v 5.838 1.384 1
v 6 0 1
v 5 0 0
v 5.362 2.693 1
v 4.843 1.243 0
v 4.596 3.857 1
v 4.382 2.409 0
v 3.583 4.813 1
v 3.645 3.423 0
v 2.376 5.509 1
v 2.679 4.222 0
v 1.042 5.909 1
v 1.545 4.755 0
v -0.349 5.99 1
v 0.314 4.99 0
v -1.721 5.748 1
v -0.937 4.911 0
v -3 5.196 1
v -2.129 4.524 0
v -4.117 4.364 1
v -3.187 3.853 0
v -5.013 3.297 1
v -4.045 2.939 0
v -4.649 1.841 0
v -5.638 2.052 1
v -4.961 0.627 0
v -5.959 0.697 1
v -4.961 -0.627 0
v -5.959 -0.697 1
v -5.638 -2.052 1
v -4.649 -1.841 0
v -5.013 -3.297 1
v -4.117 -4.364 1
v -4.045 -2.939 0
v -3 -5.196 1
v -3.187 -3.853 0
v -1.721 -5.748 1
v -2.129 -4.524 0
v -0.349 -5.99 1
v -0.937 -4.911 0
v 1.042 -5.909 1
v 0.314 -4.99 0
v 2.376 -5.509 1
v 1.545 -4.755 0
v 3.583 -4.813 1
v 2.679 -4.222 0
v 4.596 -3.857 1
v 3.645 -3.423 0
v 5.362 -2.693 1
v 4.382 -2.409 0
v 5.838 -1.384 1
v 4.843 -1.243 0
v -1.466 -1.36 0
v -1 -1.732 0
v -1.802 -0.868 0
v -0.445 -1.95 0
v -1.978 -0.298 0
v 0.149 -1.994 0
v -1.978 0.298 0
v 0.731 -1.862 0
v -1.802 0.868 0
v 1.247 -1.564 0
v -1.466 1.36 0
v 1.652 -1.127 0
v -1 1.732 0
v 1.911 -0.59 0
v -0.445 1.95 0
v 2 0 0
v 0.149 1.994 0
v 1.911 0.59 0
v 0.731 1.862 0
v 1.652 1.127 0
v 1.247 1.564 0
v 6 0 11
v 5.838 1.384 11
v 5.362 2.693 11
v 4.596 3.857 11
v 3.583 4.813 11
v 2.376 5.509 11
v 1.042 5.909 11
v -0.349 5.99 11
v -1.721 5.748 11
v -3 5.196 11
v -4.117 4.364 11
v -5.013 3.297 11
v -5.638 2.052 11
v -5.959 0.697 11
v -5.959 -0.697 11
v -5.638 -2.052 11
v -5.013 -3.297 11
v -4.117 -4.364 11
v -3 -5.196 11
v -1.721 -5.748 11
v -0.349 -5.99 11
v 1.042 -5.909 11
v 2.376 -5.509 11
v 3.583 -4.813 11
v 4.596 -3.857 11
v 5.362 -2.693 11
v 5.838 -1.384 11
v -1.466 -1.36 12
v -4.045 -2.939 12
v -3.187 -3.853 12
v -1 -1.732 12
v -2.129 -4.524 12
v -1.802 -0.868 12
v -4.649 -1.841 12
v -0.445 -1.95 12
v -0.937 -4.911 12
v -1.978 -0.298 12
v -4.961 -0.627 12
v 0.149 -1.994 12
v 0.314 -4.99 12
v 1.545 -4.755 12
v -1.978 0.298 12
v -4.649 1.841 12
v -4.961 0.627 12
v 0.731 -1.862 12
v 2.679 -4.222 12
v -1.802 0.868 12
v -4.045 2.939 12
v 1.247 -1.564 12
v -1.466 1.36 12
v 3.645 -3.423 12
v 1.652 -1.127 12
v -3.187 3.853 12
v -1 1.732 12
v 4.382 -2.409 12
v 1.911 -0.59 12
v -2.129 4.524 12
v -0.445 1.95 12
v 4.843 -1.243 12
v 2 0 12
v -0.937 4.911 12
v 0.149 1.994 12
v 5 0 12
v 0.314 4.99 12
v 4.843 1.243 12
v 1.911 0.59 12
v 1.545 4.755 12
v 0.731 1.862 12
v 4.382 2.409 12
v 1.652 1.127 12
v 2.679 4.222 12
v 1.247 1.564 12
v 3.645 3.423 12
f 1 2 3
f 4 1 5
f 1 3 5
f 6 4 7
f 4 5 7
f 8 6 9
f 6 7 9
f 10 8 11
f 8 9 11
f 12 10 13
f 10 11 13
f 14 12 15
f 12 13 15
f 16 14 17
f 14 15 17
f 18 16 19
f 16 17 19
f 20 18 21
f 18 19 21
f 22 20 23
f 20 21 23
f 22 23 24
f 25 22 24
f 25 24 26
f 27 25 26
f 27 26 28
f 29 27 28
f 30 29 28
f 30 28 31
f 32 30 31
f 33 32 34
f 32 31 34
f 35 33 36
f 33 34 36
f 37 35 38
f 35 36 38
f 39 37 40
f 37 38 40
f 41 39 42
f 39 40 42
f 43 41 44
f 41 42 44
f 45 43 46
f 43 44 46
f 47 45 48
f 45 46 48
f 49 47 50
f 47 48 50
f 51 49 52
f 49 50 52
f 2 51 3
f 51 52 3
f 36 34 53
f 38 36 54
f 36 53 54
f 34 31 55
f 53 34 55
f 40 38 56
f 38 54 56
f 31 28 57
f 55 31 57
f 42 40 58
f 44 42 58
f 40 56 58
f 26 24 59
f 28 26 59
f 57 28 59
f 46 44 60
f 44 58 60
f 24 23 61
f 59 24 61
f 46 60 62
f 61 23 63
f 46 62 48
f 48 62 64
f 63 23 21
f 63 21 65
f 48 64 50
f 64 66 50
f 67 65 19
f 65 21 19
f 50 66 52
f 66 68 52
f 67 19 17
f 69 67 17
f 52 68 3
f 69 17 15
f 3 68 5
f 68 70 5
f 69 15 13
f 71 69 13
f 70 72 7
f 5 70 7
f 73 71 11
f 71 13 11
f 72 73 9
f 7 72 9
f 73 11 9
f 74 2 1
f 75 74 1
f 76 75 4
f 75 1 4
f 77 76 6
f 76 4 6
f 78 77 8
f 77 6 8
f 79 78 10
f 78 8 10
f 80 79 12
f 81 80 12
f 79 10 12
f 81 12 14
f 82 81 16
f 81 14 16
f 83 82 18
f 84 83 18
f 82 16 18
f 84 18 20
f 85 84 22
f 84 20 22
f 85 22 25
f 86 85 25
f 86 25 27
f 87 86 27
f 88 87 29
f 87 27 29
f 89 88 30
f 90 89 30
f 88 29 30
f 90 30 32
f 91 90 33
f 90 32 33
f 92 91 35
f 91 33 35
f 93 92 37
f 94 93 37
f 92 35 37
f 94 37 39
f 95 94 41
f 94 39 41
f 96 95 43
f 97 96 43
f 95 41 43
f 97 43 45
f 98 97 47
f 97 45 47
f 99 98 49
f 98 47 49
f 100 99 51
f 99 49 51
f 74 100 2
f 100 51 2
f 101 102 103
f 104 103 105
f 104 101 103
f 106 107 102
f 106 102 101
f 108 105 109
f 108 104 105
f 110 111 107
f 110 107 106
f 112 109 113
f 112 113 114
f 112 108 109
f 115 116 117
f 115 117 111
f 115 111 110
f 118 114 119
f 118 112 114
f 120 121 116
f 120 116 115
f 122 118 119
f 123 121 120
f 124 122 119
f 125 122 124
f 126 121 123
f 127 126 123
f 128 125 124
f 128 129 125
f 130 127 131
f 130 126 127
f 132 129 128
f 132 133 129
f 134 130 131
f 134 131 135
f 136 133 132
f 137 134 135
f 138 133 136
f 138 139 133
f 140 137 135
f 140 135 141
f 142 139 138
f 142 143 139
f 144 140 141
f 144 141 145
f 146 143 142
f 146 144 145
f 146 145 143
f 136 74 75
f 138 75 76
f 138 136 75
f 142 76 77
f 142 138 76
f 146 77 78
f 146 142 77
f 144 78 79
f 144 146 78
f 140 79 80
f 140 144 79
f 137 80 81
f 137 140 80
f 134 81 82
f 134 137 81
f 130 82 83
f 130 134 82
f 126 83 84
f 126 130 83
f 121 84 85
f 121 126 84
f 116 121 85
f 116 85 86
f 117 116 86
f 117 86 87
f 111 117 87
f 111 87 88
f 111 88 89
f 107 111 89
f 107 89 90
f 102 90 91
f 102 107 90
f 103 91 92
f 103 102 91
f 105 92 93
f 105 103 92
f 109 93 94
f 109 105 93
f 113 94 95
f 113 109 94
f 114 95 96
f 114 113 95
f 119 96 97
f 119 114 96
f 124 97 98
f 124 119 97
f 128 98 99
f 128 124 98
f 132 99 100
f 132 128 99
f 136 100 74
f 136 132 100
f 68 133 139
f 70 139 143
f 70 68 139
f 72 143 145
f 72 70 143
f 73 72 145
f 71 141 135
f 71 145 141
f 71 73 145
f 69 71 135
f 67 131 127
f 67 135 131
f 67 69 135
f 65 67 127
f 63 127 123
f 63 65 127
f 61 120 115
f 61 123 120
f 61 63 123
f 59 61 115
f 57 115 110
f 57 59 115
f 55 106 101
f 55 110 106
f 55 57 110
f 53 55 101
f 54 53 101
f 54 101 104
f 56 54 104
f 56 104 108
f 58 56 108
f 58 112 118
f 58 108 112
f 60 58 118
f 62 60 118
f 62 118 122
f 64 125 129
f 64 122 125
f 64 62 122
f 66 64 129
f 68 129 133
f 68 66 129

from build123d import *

# Parameters (mm, degrees)
SKETCH1_R           = 6
BOSS_EXTRUDE1_DEPTH = 12
SKETCH2_R           = 2
CUT_EXTRUDE1_DEPTH  = 13
CHAMFER1_SIZE       = 1


with BuildPart() as part:
    # Sketch1 → Boss-Extrude1 (new body)
    with BuildSketch(Plane.XY):
        Circle(SKETCH1_R)
    extrude(amount=BOSS_EXTRUDE1_DEPTH)

    # Sketch2 → Cut-Extrude1 (cut, through all)
    with BuildSketch(Plane.XY):
        Circle(SKETCH2_R)
    extrude(amount=CUT_EXTRUDE1_DEPTH, mode=Mode.SUBTRACT)

    # Chamfer1
    chamfer1_edges = [part.edges().sort_by_distance(p)[0] for p in [
        (-6, 0, 0),
        (-6, 0, 12),
    ]]
    chamfer(chamfer1_edges, length=CHAMFER1_SIZE)


solid = part.part
